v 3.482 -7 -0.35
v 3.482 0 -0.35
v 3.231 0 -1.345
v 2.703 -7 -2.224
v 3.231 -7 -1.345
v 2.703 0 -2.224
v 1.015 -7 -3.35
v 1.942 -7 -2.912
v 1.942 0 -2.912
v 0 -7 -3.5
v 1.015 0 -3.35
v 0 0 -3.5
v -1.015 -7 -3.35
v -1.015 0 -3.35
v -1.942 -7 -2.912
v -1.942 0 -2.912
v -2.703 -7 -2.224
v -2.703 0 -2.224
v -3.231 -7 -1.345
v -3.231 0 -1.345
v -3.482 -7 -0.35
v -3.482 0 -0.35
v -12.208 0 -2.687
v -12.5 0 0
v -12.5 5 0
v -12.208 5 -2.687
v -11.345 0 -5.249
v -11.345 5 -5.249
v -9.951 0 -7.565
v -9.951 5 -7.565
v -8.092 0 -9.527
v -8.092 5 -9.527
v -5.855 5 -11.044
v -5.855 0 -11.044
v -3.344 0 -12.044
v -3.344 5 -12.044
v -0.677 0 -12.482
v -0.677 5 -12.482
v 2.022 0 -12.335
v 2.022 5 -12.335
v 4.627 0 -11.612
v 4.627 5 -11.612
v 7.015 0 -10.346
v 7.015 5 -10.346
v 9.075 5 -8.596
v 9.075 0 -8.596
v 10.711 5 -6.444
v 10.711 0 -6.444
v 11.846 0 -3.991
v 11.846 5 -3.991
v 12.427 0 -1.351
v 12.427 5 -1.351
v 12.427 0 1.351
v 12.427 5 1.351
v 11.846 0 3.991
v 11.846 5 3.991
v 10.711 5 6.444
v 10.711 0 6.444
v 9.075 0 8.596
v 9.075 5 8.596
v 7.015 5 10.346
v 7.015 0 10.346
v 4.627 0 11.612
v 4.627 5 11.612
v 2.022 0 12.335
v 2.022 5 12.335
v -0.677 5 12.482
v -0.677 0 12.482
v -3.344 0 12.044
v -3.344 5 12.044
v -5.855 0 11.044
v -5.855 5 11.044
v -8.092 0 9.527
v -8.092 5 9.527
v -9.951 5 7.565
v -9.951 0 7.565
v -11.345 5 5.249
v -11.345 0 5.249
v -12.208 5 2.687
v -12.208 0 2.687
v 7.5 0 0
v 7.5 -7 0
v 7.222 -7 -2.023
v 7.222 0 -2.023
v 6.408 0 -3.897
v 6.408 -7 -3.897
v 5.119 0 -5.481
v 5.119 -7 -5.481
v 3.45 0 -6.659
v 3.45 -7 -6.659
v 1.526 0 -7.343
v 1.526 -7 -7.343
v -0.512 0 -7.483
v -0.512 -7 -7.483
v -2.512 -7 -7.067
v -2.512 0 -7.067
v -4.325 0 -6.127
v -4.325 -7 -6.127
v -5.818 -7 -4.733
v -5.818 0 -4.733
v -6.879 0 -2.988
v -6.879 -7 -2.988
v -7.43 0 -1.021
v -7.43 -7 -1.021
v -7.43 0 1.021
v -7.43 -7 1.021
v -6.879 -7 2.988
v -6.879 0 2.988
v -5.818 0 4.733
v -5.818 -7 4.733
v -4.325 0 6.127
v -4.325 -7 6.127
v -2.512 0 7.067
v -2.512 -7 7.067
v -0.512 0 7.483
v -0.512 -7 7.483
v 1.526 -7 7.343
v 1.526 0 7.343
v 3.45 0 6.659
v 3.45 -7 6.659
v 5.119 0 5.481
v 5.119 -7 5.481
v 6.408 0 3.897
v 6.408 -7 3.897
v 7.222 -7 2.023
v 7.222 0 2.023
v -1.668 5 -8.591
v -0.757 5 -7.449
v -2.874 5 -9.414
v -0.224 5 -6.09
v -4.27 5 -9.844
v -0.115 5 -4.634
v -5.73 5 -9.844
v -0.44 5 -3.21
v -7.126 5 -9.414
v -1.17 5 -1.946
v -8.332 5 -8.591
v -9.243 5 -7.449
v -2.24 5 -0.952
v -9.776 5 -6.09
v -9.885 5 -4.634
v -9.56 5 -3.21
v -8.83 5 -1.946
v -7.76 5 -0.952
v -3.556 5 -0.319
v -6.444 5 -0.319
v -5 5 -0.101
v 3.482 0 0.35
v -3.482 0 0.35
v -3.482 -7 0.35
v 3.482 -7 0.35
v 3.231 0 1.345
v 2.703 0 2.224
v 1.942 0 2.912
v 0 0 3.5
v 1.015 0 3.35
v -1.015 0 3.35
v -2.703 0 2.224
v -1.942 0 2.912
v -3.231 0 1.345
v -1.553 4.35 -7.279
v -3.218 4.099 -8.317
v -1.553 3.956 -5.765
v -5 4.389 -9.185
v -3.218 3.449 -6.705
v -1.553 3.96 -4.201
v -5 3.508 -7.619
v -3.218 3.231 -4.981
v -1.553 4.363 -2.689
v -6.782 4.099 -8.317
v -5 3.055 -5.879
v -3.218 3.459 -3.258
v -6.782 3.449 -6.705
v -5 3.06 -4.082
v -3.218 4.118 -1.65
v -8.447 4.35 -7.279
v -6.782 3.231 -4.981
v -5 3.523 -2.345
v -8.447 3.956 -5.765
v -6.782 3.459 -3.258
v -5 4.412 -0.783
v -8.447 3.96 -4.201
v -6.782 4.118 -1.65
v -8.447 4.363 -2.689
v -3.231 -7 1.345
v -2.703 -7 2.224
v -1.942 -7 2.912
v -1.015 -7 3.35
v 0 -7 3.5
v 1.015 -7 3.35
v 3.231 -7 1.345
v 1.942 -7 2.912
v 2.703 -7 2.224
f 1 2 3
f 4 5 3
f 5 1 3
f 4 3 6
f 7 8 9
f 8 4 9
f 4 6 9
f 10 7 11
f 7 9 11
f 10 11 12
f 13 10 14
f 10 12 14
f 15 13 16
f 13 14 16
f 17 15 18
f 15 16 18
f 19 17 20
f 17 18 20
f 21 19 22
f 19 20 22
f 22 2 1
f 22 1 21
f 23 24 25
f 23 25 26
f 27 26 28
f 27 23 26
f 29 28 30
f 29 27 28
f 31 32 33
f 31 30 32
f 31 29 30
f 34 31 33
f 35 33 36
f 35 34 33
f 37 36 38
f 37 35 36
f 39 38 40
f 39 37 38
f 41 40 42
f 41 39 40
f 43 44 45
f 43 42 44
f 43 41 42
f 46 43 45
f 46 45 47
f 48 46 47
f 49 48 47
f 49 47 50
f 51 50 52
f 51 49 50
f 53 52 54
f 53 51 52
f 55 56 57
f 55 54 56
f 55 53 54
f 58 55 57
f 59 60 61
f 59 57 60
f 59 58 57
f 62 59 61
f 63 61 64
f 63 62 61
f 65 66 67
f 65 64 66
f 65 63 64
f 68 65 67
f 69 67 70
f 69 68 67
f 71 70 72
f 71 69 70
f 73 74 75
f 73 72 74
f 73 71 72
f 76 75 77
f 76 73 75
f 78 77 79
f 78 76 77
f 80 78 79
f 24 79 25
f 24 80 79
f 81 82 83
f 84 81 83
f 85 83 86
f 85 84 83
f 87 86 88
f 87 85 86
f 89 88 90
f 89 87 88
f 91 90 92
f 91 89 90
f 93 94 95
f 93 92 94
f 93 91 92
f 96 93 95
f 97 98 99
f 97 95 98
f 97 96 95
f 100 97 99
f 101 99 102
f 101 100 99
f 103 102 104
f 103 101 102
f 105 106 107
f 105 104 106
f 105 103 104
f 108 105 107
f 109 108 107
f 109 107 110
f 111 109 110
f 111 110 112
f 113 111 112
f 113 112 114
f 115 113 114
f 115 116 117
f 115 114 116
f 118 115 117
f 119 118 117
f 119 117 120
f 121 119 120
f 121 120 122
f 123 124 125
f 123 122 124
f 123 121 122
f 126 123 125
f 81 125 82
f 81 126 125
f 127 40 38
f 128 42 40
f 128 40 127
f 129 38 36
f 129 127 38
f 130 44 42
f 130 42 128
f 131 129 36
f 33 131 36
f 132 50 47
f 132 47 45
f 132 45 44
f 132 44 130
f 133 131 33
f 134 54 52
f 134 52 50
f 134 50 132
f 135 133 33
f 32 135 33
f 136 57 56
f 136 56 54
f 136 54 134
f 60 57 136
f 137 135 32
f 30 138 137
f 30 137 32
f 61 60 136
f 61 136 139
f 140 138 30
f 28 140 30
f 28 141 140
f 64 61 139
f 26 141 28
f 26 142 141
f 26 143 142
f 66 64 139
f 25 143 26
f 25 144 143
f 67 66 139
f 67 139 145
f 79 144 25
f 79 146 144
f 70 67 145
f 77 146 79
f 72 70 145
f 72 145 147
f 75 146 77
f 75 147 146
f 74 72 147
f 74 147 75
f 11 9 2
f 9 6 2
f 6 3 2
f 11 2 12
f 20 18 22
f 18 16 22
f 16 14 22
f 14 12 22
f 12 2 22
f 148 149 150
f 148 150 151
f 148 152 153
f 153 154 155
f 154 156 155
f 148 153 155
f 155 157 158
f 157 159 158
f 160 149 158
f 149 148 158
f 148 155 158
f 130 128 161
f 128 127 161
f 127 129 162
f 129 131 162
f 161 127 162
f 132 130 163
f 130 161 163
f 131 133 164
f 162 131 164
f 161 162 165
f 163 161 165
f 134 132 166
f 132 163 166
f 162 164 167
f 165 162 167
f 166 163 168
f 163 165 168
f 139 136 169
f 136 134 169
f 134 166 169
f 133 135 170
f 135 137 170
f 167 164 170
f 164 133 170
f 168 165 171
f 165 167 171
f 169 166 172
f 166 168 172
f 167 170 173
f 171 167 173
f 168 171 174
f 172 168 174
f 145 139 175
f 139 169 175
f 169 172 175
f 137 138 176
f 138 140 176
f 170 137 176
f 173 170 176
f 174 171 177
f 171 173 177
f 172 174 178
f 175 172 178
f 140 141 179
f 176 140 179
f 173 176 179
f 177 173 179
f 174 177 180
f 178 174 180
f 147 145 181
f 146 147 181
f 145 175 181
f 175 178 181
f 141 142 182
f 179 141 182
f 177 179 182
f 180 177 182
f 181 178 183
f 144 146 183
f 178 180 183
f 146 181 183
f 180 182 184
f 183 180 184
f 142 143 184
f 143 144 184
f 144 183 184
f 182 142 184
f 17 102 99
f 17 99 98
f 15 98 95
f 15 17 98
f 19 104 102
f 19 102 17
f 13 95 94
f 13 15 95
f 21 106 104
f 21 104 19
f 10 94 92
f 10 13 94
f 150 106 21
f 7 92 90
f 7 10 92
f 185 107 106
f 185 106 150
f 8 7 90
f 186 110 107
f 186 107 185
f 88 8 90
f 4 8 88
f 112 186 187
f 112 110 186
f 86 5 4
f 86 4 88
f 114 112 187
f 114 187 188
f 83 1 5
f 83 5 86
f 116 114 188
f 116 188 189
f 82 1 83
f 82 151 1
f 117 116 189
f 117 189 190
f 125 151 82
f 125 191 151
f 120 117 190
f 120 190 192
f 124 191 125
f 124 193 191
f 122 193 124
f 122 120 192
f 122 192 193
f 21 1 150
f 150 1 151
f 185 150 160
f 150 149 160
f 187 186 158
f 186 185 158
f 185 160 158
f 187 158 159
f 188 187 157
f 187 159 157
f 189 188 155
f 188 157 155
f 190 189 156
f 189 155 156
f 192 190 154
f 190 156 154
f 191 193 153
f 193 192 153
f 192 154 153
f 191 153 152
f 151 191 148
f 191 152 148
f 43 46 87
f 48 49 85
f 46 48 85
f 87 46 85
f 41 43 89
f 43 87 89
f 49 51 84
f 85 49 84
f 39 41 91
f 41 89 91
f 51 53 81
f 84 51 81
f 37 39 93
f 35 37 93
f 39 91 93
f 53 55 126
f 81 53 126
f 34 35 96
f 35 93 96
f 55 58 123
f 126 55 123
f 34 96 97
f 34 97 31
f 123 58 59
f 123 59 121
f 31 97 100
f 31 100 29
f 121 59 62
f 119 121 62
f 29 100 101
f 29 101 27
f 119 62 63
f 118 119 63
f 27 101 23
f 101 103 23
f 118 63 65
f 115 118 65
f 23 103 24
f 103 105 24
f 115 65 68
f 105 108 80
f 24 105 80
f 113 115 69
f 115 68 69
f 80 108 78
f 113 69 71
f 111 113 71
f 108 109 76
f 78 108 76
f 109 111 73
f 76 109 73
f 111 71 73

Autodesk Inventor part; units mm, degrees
ref_plane "YZ Plane" through (0, 0, 0) normal (1, 0, 0) x (0, 1, 0)
ref_plane "XZ Plane" through (0, 0, 0) normal (0, 1, 0) x (-1, 0, 0)
ref_plane "XY Plane" through (0, 0, 0) normal (0, 0, 1) x (1, 0, 0)
sketch "Esquisse1" plane through (0, 0, 0) normal (0, 1, 0) x (-1, 0, 0)
  circle A0 centre (0, 0) radius 12.5
  dimension "d0" = 25
extrude "Extrusion1" add sketch "Esquisse1" along normal blind 5
sketch "Esquisse3" plane through (0, 0, 0) normal (0, -1, 0) x (1, 0, 0)
  line L0 (-3.5, 0.35) -> (3.5, 0.35)
  line L1 (3.5, 0.35) -> (3.5, -0.35)
  line L2 (3.5, -0.35) -> (-3.5, -0.35)
  line L3 (-3.5, -0.35) -> (-3.5, 0.35)
  line L4 (-3.5, 0.35) -> (3.5, -0.35) construction
  line L5 (3.5, 0.35) -> (-3.5, -0.35) construction
  circle A0 centre (0, 0) radius 3.5
  circle A1 centre (0, 0) radius 7.5
  point P0 (3.4825, 0.35)
  point P1 (-3.4825, 0.35)
  point P2 (3.4825, -0.35)
  point P3 (-3.4825, -0.35)
  dimension "d12" = 0.7
  dimension "d14" = 7
  dimension "d15" = 4
extrude "Extrusion2" add sketch "Esquisse3" along normal blind 7 contours L0 A0 L3 | L0 A0 L2 | A0 L2 L3 | L0 L1 A0 | L1 L2 A0 | A1
ref_plane "Plan de construction1" through (0, 10, 0) normal (0, 1, 0) x (1, 0, 0)
sketch "Esquisse4" plane through (0, 10, 0) normal (0, 1, 0) x (1, 0, 0)
  line L0 (0, 0) -> (0, 22.3046) construction
  line L1 (-26.1226, 0) -> (0, 0) construction
  line L2 (-3.4825, 0.35) -> (3.4825, 0.35) projected
  arc A0 (2, 5) -> (-12, 5) centre (-5, 5) ccw
  line L3 (-12, 5) -> (2, 5)
  line L4 (-34.5536, 5) -> (31.7867, 5)
  dimension "d19" = 5
  dimension "d20" = 5
  dimension "d21" = 7
revolve "Révolution2" cut sketch "Esquisse4" angle 360 about axis through (-34.5536, 10, -5) along (1, 0, 0)
properties part number "adaptator_potentiometre_test_1"
